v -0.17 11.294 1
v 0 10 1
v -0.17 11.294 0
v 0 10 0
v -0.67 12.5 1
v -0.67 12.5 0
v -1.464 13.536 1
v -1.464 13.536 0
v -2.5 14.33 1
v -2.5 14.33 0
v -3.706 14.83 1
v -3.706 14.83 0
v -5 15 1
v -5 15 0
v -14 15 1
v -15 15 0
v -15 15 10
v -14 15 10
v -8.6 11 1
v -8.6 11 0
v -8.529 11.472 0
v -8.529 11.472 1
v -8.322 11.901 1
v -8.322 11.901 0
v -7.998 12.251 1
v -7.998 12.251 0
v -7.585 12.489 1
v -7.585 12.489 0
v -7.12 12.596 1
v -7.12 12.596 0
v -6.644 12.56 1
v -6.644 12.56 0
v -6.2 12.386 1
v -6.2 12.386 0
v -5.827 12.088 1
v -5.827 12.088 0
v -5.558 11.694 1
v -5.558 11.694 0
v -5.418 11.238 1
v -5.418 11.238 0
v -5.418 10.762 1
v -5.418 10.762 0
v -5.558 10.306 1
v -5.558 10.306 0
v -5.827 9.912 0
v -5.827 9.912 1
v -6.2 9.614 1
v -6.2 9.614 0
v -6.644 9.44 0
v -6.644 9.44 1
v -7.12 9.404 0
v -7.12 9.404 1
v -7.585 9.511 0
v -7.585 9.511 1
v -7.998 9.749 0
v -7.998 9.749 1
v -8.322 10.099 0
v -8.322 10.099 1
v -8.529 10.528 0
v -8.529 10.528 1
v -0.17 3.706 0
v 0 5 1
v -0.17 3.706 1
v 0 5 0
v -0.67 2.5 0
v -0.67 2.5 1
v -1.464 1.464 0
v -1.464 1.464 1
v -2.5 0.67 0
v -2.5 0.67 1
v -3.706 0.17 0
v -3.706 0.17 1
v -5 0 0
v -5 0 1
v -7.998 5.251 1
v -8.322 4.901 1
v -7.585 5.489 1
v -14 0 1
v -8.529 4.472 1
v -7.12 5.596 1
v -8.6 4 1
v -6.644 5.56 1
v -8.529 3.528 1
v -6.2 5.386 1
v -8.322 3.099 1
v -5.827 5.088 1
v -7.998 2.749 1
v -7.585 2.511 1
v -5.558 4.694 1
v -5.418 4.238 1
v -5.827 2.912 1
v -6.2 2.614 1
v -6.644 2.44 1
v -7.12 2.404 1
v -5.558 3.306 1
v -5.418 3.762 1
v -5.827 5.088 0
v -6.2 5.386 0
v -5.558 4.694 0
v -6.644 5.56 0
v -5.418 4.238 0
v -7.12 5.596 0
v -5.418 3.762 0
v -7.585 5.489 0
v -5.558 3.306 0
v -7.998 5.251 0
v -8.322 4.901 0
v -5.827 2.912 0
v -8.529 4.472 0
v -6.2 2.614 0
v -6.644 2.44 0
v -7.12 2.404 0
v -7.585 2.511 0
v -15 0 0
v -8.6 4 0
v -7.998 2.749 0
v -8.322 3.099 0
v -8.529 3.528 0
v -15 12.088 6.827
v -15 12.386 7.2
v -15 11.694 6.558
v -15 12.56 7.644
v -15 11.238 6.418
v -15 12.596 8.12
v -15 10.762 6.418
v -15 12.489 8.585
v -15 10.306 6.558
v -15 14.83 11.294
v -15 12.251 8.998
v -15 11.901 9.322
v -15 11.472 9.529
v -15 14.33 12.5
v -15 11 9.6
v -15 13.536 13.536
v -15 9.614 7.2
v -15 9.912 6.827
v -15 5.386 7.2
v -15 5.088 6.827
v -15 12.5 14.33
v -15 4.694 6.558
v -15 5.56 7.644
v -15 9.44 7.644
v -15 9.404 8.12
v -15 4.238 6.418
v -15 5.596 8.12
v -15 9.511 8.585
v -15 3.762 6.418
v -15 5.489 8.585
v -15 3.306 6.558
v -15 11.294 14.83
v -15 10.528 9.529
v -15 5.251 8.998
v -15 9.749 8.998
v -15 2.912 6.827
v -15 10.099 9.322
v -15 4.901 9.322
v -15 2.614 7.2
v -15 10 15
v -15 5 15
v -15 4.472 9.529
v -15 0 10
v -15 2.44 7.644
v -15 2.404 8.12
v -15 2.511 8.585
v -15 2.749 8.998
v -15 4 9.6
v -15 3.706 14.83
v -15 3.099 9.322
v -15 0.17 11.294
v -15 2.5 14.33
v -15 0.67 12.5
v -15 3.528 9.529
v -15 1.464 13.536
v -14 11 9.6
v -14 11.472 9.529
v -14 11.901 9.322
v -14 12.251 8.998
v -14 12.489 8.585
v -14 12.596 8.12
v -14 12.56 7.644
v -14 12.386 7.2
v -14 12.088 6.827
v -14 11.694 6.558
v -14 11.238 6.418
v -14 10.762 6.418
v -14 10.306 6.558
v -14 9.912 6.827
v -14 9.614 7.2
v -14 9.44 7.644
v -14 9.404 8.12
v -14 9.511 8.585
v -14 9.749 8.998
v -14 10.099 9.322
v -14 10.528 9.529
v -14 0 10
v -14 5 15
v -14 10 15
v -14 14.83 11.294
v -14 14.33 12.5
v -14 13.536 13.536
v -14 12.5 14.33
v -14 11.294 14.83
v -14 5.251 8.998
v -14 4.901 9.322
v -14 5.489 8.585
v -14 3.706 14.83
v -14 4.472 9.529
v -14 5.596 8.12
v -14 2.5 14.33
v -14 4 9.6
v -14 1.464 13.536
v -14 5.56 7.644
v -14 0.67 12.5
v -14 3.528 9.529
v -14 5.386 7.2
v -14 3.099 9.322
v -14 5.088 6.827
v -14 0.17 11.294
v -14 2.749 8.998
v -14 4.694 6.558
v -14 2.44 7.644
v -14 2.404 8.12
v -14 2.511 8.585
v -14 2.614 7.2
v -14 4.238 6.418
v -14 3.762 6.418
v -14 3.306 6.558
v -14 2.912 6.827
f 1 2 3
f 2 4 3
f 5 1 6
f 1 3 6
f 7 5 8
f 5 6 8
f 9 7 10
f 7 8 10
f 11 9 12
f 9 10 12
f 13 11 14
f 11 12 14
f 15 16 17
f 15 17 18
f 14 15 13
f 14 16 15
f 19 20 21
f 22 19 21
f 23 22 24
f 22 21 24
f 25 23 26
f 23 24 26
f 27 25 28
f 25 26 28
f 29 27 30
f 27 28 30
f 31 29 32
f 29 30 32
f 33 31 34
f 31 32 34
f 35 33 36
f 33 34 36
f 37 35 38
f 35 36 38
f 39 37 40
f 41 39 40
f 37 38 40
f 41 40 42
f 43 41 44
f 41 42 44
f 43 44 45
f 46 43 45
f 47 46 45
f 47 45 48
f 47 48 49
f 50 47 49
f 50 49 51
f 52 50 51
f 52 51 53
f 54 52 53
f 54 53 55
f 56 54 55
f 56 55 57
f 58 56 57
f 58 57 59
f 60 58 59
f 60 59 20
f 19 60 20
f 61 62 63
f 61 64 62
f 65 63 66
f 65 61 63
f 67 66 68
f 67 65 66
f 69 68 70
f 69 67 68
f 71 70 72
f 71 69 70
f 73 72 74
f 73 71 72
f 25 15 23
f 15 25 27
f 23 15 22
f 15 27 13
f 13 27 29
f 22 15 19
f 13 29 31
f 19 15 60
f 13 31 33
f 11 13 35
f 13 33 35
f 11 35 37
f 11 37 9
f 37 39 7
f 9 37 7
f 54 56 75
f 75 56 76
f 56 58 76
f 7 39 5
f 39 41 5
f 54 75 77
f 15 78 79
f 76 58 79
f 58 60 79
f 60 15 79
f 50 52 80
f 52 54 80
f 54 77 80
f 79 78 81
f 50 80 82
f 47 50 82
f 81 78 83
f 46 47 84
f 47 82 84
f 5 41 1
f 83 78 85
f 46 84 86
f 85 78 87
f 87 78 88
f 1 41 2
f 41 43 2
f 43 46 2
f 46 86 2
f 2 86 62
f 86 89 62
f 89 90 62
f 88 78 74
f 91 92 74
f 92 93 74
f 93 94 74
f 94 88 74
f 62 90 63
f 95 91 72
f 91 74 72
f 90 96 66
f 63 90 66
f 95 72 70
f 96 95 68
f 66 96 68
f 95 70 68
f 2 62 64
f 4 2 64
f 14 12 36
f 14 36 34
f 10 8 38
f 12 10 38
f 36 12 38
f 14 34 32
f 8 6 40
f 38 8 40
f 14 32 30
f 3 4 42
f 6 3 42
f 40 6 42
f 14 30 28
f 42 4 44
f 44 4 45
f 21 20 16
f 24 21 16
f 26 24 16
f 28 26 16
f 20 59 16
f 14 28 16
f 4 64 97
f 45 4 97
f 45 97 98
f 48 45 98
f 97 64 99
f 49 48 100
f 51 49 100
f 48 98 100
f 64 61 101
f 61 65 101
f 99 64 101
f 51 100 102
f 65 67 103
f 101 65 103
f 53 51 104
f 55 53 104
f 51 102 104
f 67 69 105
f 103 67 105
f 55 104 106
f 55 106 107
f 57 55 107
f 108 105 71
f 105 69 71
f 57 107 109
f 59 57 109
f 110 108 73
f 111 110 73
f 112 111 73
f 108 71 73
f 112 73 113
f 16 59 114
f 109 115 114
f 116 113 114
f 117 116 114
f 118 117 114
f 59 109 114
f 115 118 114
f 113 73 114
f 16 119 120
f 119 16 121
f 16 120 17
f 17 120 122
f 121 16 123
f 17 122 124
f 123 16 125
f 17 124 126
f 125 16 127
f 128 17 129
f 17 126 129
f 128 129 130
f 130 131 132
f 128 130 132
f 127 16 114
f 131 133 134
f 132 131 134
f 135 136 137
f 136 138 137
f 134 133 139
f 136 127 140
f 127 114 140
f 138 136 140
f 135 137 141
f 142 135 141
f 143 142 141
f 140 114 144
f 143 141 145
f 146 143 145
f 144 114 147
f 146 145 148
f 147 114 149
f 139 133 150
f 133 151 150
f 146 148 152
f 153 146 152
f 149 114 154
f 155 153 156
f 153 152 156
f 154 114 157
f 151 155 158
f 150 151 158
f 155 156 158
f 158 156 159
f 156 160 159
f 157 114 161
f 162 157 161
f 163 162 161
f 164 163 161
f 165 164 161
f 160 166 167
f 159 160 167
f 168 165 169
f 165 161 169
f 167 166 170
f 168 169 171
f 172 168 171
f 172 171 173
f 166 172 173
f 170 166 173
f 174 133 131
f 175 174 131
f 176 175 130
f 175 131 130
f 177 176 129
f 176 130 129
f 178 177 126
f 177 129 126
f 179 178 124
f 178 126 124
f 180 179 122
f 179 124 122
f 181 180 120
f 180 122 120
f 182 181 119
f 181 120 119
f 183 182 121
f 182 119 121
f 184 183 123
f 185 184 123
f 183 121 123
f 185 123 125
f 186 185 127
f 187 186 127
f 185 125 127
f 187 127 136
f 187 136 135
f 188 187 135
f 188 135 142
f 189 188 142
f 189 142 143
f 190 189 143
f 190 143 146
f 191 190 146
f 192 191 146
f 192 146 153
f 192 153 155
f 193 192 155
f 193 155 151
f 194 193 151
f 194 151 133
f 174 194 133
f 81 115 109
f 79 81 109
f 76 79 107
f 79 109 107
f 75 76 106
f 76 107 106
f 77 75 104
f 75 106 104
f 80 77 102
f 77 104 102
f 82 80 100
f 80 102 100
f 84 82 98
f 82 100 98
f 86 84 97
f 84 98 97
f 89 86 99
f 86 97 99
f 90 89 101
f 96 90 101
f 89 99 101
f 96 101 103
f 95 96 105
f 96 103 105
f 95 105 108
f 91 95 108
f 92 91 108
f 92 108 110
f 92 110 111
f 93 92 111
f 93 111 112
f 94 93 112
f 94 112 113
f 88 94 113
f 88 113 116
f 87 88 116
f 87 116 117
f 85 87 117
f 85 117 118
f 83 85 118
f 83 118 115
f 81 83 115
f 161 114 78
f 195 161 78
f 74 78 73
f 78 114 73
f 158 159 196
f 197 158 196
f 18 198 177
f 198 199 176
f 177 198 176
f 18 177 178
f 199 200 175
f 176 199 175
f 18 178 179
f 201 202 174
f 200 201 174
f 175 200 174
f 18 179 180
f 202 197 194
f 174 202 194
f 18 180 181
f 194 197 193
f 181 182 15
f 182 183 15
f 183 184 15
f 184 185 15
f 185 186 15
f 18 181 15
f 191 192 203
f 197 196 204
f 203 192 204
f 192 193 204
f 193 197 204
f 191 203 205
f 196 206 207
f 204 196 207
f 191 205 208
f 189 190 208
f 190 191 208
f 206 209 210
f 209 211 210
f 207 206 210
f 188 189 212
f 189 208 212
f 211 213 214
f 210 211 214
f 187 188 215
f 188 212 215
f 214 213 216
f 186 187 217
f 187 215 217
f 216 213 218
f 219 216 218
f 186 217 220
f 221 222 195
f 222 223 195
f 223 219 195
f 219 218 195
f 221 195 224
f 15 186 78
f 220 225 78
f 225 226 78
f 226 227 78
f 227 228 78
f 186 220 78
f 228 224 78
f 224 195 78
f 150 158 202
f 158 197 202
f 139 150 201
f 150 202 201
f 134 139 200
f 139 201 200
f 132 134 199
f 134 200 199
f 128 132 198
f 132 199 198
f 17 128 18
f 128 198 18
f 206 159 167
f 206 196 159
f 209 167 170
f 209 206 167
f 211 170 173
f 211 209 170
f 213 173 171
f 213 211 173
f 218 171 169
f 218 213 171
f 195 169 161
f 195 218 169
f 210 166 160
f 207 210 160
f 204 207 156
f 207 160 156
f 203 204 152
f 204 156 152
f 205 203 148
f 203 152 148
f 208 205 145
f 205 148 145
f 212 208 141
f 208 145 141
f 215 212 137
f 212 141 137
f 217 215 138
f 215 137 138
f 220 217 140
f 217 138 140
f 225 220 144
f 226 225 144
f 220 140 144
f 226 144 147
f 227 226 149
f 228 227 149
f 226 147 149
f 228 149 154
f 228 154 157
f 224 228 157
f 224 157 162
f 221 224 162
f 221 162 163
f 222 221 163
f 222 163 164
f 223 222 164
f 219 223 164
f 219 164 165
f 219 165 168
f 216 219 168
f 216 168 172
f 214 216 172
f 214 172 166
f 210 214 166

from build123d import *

# Parameters (mm, degrees)
EXTRUDE_1_DEPTH     = 15
FILLET_1_R          = 5
SKETCH_2_R          = 1.6
CUT_EXTRUDE_1_DEPTH = 15
SKETCH_3_R          = 1.6
CUT_EXTRUDE_2_DEPTH = 15


with BuildPart() as part:
    # 草图1 → 凸台-拉伸1 (new body)
    with BuildSketch(Plane(origin=(0, 0, 0), x_dir=(1, 0, 0), z_dir=(0, 1, 0))):
        Polygon((0, 0), (-15, 0), (-15, -15), (-14, -15), (-14, -1), (0, -1), align=None)
    extrude(amount=EXTRUDE_1_DEPTH)

    # 圆角1
    fillet_1_edges = [part.edges().sort_by_distance(p)[0] for p in [
        (-14.5, 15, 15),
        (0, 15, 0.5),
        (-14.5, 0, 15),
        (0, 0, 0.5),
    ]]
    fillet(fillet_1_edges, radius=FILLET_1_R)

    # 草图2 → 切除-拉伸1 (cut)
    with BuildSketch(Plane(origin=(0, 0, 0), x_dir=(-1, 0, 0), z_dir=(0, 0, -1))):
        with Locations((7, 11)):
            Circle(SKETCH_2_R)
        with Locations((7, 4)):
            Circle(SKETCH_2_R)
    extrude(amount=-CUT_EXTRUDE_1_DEPTH, mode=Mode.SUBTRACT)

    # 草图3 → 切除-拉伸2 (cut)
    with BuildSketch(Plane.ZY.offset(15)):
        with Locations((8, 11)):
            Circle(SKETCH_3_R)
        with Locations((8, 4)):
            Circle(SKETCH_3_R)
    extrude(amount=-CUT_EXTRUDE_2_DEPTH, mode=Mode.SUBTRACT)


solid = part.part
